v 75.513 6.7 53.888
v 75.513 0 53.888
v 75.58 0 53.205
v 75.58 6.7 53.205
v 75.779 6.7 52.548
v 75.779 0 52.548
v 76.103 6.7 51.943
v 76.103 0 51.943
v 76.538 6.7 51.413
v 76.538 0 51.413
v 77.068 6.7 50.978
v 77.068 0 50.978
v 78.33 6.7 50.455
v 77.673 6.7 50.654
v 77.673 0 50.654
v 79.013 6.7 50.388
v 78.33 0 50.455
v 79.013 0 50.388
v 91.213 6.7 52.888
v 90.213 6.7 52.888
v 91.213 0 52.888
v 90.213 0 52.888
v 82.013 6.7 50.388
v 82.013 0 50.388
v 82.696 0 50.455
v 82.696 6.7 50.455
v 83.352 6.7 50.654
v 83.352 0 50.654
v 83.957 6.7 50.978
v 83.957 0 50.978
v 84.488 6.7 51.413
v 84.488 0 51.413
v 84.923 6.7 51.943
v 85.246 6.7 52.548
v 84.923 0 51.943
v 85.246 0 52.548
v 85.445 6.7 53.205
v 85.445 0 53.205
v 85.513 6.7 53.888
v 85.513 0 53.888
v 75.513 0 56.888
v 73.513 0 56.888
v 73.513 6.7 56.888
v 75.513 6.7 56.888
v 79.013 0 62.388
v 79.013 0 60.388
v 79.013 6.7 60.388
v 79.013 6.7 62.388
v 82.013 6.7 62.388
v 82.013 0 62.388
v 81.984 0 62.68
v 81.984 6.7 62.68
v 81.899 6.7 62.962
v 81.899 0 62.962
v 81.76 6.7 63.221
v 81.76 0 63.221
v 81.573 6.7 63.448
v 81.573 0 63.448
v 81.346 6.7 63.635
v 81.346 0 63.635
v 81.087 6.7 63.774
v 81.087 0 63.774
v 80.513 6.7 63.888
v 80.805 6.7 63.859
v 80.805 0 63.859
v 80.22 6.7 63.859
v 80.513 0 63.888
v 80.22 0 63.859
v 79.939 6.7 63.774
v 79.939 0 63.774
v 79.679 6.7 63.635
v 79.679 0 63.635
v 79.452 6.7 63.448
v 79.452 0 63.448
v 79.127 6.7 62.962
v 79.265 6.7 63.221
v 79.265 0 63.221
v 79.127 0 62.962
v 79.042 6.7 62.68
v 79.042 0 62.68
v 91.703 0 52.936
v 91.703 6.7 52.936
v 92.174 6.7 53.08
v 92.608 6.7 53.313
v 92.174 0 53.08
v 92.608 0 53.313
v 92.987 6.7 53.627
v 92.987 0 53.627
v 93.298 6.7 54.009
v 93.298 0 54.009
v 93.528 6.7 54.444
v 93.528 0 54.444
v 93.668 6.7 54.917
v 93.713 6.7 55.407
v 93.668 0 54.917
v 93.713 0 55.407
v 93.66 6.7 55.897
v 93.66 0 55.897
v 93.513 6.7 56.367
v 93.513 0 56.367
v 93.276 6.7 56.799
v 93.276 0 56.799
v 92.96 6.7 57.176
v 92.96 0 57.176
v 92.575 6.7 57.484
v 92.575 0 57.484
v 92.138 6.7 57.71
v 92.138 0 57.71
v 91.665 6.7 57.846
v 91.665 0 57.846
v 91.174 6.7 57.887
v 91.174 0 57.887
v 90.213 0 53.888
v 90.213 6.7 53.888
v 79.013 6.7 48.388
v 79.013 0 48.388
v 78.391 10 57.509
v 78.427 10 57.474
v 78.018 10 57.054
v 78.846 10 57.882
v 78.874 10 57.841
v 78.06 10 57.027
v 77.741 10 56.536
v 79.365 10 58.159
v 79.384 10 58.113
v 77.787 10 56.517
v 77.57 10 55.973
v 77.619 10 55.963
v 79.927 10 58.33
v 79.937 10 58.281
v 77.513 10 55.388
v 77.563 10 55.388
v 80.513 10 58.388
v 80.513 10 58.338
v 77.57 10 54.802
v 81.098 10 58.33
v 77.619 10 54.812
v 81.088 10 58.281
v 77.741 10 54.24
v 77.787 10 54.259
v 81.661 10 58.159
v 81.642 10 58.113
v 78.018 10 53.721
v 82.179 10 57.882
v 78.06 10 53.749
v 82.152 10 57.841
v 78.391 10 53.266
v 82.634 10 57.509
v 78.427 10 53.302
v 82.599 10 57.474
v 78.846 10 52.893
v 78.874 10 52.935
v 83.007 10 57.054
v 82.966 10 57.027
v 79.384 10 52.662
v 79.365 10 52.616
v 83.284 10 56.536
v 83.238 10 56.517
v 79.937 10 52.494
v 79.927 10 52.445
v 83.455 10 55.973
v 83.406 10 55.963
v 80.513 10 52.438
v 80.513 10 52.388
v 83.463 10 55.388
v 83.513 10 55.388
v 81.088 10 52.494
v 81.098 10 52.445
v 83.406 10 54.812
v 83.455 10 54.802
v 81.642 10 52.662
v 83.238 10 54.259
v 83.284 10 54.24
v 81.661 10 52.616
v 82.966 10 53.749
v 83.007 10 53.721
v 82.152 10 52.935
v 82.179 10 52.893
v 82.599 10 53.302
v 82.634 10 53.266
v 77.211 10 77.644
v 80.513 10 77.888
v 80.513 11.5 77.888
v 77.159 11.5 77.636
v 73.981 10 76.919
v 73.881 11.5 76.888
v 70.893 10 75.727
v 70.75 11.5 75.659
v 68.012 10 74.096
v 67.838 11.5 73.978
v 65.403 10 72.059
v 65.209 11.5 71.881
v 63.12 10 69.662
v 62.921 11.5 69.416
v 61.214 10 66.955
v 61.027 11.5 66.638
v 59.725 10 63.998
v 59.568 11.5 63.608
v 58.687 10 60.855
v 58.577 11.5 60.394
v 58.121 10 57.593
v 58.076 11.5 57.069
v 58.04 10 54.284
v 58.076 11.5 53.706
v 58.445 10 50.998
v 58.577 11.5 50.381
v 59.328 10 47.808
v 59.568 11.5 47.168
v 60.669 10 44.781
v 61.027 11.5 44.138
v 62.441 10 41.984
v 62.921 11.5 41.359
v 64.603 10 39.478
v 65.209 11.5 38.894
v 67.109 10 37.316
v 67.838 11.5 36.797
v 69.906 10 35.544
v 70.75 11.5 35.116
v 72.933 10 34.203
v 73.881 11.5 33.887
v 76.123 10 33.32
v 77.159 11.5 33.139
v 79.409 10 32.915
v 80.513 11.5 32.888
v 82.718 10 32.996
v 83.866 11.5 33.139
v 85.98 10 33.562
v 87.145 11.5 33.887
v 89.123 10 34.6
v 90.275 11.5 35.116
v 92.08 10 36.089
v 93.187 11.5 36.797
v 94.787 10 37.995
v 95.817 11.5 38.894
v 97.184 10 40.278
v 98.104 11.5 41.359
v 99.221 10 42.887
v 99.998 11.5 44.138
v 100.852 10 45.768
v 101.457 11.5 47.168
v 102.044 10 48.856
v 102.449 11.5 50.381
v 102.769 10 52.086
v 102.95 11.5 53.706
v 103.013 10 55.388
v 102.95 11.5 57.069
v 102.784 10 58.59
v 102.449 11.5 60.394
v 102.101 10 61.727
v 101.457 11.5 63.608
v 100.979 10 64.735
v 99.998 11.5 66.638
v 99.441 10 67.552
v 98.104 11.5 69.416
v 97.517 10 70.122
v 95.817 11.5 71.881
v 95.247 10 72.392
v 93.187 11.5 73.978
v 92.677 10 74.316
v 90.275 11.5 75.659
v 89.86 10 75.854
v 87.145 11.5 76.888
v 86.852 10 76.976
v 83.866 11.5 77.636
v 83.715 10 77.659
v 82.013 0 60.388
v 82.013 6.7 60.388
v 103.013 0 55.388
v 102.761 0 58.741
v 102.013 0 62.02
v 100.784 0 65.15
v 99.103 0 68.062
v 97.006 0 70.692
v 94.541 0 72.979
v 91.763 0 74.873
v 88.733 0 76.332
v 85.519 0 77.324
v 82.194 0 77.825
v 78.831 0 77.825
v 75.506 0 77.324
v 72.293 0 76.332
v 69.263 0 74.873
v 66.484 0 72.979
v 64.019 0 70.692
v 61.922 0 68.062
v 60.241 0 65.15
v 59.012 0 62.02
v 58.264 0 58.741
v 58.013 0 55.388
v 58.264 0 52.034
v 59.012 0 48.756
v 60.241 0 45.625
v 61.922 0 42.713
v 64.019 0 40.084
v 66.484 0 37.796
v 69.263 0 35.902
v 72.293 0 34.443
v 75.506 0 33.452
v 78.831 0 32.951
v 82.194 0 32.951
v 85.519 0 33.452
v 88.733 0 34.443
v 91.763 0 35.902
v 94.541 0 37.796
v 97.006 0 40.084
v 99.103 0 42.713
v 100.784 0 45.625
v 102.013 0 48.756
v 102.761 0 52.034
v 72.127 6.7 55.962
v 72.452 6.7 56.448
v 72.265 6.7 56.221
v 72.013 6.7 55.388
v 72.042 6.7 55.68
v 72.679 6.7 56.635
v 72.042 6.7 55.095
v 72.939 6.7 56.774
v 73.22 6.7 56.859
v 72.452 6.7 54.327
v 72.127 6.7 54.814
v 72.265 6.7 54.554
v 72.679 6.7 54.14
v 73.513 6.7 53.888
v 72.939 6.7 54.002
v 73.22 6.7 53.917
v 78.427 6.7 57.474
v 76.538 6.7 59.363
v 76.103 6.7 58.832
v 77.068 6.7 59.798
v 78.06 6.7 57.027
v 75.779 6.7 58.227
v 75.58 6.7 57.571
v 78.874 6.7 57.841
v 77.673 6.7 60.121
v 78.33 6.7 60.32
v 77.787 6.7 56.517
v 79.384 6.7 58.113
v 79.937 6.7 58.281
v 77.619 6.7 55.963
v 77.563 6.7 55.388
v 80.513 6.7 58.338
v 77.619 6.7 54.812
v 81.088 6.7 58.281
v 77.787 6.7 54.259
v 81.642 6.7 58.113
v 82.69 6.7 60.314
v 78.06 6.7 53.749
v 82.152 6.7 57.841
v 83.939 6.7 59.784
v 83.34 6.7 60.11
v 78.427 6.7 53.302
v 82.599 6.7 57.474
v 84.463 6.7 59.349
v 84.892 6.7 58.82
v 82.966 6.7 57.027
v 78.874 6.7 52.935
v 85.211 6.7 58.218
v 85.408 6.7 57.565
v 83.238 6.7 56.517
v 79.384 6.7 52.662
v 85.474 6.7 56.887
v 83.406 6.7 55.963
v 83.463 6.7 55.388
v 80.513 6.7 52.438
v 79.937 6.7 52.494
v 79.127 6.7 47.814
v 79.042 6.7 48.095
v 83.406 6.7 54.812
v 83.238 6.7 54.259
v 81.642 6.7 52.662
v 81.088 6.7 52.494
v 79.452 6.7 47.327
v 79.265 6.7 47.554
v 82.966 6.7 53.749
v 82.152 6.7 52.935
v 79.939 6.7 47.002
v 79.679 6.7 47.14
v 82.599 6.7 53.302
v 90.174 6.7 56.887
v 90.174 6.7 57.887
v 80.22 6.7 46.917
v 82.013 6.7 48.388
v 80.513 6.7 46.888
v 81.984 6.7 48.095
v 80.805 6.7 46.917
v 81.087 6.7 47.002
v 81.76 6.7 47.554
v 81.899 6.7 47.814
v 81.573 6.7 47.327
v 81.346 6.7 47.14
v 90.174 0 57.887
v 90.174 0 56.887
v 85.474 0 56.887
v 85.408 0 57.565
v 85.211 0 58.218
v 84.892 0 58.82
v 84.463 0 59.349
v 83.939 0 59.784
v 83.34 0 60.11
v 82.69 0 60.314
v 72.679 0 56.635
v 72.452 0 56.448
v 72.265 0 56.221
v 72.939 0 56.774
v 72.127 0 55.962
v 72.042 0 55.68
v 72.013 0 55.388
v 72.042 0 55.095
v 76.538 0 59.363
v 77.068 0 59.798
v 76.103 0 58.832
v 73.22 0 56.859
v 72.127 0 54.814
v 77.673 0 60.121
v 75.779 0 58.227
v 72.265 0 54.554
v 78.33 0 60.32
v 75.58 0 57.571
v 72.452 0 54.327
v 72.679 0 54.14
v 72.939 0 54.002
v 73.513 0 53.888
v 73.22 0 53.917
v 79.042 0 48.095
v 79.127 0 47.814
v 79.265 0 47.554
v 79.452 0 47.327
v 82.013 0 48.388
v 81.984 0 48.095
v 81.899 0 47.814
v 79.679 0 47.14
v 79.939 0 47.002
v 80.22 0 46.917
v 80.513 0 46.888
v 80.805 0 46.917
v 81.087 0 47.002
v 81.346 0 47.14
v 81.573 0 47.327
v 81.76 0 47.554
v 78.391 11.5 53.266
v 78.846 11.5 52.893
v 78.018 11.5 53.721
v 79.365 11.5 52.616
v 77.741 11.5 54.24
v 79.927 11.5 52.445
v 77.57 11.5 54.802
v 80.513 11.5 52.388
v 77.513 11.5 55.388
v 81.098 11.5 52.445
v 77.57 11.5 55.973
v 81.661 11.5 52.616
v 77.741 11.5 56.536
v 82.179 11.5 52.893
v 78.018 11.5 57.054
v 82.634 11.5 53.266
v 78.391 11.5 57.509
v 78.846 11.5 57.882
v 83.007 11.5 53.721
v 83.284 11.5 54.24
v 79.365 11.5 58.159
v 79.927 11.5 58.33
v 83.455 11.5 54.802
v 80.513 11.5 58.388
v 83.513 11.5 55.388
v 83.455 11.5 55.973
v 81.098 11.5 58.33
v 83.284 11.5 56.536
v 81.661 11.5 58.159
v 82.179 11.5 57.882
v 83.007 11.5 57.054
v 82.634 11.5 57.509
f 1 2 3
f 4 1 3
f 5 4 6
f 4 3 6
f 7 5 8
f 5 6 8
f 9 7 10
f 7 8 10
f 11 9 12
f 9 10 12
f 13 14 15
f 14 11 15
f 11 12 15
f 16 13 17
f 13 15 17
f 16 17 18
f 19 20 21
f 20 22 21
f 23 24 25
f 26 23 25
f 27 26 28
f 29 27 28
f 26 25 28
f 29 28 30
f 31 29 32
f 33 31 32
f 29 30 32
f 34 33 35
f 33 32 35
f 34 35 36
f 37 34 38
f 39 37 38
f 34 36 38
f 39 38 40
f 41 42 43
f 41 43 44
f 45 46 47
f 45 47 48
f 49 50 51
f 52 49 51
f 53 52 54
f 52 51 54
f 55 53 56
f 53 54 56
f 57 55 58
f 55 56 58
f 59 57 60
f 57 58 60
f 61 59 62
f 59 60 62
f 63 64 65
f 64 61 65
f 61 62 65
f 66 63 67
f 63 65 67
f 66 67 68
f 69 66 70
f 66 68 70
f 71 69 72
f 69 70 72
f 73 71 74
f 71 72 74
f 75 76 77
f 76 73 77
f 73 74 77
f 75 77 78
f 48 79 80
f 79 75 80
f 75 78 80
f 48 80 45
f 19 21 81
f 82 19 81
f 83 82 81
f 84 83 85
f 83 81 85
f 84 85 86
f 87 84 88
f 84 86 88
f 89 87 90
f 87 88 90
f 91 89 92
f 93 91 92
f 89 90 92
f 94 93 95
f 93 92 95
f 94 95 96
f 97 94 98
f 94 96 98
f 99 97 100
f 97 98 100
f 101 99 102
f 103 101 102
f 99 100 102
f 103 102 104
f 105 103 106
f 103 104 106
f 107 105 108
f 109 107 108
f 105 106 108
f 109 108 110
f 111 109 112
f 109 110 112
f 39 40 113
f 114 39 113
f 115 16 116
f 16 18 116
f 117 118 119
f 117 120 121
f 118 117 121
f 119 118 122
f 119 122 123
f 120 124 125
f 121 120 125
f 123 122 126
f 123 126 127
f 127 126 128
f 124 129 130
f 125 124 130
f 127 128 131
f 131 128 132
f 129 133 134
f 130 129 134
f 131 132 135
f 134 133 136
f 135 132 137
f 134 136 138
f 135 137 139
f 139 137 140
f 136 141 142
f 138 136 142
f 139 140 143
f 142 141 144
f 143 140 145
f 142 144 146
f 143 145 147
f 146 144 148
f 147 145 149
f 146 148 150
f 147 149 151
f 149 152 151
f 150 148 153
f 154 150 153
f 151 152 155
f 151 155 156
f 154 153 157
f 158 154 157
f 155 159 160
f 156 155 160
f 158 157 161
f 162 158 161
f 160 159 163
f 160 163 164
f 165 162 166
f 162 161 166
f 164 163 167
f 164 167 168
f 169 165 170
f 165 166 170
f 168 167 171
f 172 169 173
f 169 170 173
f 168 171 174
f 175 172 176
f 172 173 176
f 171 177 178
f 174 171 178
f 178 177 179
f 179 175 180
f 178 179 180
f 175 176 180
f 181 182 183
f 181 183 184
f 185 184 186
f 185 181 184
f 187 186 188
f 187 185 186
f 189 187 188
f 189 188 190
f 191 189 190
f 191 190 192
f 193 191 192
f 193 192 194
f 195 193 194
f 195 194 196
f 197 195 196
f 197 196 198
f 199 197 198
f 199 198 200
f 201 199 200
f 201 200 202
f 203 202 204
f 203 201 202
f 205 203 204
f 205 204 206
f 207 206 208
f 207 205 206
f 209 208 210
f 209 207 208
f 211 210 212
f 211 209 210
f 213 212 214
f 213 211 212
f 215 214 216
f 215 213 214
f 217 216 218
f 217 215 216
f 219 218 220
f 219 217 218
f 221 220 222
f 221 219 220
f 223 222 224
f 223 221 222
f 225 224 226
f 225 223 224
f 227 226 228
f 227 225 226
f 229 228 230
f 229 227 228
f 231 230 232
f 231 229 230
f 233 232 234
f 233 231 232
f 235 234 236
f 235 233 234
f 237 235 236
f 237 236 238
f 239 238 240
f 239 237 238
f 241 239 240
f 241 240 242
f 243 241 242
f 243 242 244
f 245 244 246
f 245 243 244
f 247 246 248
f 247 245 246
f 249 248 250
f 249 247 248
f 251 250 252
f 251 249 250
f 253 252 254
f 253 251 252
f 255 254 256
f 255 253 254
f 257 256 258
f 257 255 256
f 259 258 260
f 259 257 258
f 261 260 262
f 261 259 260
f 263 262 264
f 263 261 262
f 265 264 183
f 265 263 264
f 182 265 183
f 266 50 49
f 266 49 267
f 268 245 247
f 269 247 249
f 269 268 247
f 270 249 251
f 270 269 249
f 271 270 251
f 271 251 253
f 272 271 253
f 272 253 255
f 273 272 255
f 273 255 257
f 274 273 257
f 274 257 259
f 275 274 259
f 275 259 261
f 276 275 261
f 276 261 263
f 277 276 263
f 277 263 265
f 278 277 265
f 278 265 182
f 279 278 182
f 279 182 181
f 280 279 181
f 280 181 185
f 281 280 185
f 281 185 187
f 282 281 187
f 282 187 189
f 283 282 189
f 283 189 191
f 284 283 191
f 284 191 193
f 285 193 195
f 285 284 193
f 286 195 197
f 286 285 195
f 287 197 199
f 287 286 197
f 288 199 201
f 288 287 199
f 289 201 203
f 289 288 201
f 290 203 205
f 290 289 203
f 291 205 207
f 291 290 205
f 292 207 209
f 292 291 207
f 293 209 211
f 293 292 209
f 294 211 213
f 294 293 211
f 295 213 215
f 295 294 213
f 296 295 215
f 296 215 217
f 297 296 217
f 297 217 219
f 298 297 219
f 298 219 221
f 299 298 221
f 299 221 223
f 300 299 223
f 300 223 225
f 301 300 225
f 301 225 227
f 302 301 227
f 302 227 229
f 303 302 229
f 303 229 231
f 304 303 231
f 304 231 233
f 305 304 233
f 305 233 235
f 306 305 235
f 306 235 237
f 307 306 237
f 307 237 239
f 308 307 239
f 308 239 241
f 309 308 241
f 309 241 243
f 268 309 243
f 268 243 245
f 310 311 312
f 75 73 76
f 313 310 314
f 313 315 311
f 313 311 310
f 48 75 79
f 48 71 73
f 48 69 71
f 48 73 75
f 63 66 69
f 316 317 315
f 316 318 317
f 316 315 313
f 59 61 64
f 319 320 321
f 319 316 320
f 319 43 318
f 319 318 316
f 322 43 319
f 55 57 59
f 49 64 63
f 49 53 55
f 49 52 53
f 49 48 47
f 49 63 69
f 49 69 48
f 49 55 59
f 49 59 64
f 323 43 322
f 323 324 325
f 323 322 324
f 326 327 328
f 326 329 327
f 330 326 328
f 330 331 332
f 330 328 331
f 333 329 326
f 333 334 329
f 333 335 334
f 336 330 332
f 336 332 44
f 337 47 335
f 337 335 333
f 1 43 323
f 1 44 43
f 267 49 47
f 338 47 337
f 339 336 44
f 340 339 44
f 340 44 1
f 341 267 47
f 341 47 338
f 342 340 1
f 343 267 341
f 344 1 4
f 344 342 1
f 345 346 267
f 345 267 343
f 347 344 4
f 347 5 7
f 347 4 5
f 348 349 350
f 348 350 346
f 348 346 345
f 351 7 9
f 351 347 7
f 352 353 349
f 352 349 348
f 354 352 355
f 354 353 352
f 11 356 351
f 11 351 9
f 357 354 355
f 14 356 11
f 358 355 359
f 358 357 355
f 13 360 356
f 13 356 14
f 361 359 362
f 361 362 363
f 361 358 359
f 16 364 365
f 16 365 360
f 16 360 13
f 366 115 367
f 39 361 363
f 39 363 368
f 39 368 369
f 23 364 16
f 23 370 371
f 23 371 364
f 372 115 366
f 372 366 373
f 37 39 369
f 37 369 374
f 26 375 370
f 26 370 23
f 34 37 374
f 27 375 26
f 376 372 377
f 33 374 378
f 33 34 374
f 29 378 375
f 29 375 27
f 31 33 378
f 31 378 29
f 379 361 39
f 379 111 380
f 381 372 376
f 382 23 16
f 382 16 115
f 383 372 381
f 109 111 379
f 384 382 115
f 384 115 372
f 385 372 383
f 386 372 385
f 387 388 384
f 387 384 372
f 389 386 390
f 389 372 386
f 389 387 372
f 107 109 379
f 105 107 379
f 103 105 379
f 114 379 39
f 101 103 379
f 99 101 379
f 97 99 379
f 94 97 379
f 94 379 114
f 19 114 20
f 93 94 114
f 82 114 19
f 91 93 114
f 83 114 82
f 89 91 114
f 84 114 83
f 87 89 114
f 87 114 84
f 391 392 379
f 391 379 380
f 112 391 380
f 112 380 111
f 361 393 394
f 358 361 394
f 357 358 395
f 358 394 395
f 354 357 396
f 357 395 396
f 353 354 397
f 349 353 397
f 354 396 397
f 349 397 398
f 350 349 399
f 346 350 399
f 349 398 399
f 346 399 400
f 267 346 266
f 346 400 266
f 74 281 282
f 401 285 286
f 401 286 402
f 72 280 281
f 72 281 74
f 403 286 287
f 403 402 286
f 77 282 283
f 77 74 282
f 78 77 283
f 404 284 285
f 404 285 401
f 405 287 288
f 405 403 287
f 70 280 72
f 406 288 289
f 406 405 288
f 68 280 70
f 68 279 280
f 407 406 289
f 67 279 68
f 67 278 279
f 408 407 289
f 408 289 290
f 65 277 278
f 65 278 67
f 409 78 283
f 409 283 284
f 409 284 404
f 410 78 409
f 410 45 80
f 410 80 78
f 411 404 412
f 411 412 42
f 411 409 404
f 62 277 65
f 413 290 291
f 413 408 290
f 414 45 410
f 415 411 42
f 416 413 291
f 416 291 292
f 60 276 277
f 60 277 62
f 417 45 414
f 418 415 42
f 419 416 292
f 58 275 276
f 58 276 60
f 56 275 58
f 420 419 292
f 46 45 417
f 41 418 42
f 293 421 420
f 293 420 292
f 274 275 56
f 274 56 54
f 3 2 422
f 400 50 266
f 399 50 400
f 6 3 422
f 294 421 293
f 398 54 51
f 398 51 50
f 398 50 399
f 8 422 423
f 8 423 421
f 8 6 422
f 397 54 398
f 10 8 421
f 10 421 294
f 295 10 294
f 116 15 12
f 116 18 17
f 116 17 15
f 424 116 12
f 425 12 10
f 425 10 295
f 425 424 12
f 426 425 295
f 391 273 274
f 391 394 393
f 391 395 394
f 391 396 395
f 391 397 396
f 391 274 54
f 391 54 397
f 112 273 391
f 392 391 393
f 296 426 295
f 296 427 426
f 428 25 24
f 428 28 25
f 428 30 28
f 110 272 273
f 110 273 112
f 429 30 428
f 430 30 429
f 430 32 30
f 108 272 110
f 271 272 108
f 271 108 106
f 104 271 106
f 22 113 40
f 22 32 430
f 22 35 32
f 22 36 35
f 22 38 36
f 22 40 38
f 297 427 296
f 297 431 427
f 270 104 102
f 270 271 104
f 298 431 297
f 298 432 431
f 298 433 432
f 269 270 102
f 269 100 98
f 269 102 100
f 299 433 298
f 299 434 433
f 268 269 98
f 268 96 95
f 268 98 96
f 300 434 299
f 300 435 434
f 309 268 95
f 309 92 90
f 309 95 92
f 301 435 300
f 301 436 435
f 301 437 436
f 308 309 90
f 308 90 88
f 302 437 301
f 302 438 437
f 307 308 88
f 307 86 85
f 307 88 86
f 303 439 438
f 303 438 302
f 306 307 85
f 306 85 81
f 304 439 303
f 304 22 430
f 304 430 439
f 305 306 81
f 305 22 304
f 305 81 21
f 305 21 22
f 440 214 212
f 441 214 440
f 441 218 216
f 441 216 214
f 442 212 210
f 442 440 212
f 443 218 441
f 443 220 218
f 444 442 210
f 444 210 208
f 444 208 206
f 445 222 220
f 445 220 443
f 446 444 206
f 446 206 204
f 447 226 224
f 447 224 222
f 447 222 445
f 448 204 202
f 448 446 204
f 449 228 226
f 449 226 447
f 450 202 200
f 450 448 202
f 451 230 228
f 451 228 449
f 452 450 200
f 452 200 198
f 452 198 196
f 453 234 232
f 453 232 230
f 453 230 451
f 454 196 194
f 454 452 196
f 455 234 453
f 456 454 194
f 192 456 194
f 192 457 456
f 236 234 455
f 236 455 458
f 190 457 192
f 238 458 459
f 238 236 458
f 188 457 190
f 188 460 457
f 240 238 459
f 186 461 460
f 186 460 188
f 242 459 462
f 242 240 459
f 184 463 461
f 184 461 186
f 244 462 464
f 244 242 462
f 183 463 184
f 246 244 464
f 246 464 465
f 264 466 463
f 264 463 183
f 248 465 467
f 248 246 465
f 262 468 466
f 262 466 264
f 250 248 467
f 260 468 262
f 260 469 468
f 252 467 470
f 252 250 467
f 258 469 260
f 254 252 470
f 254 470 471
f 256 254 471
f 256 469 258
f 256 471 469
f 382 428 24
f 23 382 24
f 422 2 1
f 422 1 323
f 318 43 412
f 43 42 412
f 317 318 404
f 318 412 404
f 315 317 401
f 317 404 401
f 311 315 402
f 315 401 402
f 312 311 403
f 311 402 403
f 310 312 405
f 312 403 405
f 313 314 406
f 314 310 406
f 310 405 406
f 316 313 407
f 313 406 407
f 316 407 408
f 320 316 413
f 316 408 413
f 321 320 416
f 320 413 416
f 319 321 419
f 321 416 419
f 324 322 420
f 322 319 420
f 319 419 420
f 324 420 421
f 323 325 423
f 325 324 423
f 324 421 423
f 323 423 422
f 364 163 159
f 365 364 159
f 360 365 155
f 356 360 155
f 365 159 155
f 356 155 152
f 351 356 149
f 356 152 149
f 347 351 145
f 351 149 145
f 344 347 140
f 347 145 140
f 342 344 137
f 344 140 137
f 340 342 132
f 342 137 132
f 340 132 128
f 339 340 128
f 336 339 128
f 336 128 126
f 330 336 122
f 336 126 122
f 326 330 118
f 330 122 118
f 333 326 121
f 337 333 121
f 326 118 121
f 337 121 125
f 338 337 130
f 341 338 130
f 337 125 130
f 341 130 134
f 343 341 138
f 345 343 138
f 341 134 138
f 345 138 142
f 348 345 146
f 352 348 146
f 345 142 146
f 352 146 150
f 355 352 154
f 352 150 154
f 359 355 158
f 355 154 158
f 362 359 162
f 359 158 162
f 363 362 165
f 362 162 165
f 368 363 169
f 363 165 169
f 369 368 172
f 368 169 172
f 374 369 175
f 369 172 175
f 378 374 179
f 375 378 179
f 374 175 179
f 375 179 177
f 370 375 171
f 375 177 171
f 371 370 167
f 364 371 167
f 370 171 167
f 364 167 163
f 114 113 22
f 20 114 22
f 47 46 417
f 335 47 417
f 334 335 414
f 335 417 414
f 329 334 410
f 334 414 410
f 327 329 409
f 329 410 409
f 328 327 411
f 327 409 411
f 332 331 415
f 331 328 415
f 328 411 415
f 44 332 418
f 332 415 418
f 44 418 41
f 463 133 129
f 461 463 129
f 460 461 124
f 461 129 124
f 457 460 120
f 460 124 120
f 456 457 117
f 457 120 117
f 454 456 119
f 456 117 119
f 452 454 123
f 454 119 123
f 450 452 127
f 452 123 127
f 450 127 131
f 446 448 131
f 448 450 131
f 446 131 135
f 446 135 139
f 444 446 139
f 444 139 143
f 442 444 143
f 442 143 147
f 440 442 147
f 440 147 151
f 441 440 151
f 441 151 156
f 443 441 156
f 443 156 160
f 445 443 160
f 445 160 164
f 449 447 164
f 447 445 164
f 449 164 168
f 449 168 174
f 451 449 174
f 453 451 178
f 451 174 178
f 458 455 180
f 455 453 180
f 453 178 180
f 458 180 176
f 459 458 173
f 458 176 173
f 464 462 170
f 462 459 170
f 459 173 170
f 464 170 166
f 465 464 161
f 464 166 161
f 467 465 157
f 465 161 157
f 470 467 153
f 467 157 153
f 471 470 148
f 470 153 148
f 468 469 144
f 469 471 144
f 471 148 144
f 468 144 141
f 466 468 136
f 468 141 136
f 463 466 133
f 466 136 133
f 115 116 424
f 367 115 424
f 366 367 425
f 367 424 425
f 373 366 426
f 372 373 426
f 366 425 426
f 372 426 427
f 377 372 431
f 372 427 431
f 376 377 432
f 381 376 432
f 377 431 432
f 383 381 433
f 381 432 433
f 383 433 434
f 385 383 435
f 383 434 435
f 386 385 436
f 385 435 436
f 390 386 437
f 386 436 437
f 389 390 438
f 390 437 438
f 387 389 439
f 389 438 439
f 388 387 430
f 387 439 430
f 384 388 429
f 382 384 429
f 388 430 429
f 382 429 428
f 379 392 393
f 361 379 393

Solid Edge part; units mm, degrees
sketch "Sketch1" plane through (0, 0, 0) normal (0, -1, 0) x (1, 0, 0)
  circle A0 centre (80.5127, 55.3877) radius 22.5
  dimension "D1" = 45
extrude "Protrusion1" add sketch "Sketch1" against normal blind 10
sketch "Sketch2" plane through (80.5127, 10, 55.3877) normal (0, 1, 0) x (0, 0, -1)
  circle A0 centre (0, 0) radius 2.95
  dimension "D1" = 5.9
extrude "ExtrudedCutout_5" cut sketch "Sketch2" against normal blind 4
sketch "Sketch3" plane through (80.5127, 6, 55.3877) normal (0, 1, 0) x (-1, 0, 0)
  circle A0 centre (0, 0) radius 1.05
  dimension "D1" = 2.1
extrude "Cutout1" cut sketch "Sketch3" against normal up to next
sketch "Sketch4" plane through (80.5127, 5, 51.1598) normal (0, -1, 0) x (1, 0, 0)
  circle A0 centre (0, 4.2279) radius 3.55
extrude "ExtrudedCutout_7" cut sketch "Sketch4" against normal blind 0.5
chamfer "Chamfer_2" distance 1.9 distance2 0.5 1 edges at (80.5127, 6, 58.3377) measured on face at (78.605, 6, 53.362)
sketch "Sketch5" plane through (80.5127, 10, 55.3877) normal (0, 1, 0) x (0, 0, 1)
  circle A0 centre (0, 0) radius 22.5
  circle A1 centre (0, 0) radius 3
  dimension "D1" = 45
extrude "ExtrudedProtrusion_4" add sketch "Sketch5" along normal blind 1.5
sketch "Sketch6" plane through (80.5127, 0, 55.3877) normal (0, -1, 0) x (0, 0, 1)
  line L0 (-1.5, -5) -> (-1.5, -9.7)
  line L1 (-1.5, -9.7) -> (-2.5, -9.7)
  line L2 (-2.5, -9.7) -> (-2.5, -10.7)
  arc A0 (-2.5, -10.7) -> (2.4996, -10.6613) centre (0, -10.7) ccw
  line L3 (2.4996, -9.6613) -> (2.4996, -10.6613)
  line L4 (1.4996, -9.6613) -> (2.4996, -9.6613)
  line L5 (1.4996, -9.6613) -> (1.4996, -4.9613)
  arc A1 (1.4996, -4.9613) -> (5, -1.5) centre (1.4996, -1.4607) ccw
  line L6 (7, -1.5) -> (5, -1.5)
  arc A2 (7, 1.5) -> (7, -1.5) centre (7, 0) cw
  line L7 (5, 1.5) -> (7, 1.5)
  arc A3 (1.5, 5) -> (5, 1.5) centre (1.5, 1.5) cw
  line L8 (1.5, 7) -> (1.5, 5)
  arc A4 (-1.5, 7) -> (1.5, 7) centre (0, 7) cw
  line L9 (-1.5, 5) -> (-1.5, 7)
  arc A5 (-5, 1.5) -> (-1.5, 5) centre (-1.5, 1.5) cw
  line L10 (-5, 1.5) -> (-7, 1.5)
  arc A6 (-7, 1.5) -> (-7, -1.5) centre (-7, 0) ccw
  line L11 (-7, -1.5) -> (-5, -1.5)
  arc A7 (-5, -1.5) -> (-1.5, -5) centre (-1.5, -1.5) ccw
  dimension "D1" = 2
  dimension "D2" = 1.5
  dimension "D3" = 2
  dimension "D4" = 2
  dimension "D5" = 1.5
  dimension "D6" = 5
  dimension "D7" = 5
  dimension "D8" = 4.7
  dimension "D9" = 5
  dimension "D10" = 1.5
  dimension "D11" = 2
  dimension "D12" = 2
  dimension "D13" = 1.5
  dimension "D14" = 2
  dimension "D15" = 4.7
  dimension "D16" = 1
  dimension "D17" = 1
extrude "ExtrudedCutout_9" cut sketch "Sketch6" against normal blind 6.7
